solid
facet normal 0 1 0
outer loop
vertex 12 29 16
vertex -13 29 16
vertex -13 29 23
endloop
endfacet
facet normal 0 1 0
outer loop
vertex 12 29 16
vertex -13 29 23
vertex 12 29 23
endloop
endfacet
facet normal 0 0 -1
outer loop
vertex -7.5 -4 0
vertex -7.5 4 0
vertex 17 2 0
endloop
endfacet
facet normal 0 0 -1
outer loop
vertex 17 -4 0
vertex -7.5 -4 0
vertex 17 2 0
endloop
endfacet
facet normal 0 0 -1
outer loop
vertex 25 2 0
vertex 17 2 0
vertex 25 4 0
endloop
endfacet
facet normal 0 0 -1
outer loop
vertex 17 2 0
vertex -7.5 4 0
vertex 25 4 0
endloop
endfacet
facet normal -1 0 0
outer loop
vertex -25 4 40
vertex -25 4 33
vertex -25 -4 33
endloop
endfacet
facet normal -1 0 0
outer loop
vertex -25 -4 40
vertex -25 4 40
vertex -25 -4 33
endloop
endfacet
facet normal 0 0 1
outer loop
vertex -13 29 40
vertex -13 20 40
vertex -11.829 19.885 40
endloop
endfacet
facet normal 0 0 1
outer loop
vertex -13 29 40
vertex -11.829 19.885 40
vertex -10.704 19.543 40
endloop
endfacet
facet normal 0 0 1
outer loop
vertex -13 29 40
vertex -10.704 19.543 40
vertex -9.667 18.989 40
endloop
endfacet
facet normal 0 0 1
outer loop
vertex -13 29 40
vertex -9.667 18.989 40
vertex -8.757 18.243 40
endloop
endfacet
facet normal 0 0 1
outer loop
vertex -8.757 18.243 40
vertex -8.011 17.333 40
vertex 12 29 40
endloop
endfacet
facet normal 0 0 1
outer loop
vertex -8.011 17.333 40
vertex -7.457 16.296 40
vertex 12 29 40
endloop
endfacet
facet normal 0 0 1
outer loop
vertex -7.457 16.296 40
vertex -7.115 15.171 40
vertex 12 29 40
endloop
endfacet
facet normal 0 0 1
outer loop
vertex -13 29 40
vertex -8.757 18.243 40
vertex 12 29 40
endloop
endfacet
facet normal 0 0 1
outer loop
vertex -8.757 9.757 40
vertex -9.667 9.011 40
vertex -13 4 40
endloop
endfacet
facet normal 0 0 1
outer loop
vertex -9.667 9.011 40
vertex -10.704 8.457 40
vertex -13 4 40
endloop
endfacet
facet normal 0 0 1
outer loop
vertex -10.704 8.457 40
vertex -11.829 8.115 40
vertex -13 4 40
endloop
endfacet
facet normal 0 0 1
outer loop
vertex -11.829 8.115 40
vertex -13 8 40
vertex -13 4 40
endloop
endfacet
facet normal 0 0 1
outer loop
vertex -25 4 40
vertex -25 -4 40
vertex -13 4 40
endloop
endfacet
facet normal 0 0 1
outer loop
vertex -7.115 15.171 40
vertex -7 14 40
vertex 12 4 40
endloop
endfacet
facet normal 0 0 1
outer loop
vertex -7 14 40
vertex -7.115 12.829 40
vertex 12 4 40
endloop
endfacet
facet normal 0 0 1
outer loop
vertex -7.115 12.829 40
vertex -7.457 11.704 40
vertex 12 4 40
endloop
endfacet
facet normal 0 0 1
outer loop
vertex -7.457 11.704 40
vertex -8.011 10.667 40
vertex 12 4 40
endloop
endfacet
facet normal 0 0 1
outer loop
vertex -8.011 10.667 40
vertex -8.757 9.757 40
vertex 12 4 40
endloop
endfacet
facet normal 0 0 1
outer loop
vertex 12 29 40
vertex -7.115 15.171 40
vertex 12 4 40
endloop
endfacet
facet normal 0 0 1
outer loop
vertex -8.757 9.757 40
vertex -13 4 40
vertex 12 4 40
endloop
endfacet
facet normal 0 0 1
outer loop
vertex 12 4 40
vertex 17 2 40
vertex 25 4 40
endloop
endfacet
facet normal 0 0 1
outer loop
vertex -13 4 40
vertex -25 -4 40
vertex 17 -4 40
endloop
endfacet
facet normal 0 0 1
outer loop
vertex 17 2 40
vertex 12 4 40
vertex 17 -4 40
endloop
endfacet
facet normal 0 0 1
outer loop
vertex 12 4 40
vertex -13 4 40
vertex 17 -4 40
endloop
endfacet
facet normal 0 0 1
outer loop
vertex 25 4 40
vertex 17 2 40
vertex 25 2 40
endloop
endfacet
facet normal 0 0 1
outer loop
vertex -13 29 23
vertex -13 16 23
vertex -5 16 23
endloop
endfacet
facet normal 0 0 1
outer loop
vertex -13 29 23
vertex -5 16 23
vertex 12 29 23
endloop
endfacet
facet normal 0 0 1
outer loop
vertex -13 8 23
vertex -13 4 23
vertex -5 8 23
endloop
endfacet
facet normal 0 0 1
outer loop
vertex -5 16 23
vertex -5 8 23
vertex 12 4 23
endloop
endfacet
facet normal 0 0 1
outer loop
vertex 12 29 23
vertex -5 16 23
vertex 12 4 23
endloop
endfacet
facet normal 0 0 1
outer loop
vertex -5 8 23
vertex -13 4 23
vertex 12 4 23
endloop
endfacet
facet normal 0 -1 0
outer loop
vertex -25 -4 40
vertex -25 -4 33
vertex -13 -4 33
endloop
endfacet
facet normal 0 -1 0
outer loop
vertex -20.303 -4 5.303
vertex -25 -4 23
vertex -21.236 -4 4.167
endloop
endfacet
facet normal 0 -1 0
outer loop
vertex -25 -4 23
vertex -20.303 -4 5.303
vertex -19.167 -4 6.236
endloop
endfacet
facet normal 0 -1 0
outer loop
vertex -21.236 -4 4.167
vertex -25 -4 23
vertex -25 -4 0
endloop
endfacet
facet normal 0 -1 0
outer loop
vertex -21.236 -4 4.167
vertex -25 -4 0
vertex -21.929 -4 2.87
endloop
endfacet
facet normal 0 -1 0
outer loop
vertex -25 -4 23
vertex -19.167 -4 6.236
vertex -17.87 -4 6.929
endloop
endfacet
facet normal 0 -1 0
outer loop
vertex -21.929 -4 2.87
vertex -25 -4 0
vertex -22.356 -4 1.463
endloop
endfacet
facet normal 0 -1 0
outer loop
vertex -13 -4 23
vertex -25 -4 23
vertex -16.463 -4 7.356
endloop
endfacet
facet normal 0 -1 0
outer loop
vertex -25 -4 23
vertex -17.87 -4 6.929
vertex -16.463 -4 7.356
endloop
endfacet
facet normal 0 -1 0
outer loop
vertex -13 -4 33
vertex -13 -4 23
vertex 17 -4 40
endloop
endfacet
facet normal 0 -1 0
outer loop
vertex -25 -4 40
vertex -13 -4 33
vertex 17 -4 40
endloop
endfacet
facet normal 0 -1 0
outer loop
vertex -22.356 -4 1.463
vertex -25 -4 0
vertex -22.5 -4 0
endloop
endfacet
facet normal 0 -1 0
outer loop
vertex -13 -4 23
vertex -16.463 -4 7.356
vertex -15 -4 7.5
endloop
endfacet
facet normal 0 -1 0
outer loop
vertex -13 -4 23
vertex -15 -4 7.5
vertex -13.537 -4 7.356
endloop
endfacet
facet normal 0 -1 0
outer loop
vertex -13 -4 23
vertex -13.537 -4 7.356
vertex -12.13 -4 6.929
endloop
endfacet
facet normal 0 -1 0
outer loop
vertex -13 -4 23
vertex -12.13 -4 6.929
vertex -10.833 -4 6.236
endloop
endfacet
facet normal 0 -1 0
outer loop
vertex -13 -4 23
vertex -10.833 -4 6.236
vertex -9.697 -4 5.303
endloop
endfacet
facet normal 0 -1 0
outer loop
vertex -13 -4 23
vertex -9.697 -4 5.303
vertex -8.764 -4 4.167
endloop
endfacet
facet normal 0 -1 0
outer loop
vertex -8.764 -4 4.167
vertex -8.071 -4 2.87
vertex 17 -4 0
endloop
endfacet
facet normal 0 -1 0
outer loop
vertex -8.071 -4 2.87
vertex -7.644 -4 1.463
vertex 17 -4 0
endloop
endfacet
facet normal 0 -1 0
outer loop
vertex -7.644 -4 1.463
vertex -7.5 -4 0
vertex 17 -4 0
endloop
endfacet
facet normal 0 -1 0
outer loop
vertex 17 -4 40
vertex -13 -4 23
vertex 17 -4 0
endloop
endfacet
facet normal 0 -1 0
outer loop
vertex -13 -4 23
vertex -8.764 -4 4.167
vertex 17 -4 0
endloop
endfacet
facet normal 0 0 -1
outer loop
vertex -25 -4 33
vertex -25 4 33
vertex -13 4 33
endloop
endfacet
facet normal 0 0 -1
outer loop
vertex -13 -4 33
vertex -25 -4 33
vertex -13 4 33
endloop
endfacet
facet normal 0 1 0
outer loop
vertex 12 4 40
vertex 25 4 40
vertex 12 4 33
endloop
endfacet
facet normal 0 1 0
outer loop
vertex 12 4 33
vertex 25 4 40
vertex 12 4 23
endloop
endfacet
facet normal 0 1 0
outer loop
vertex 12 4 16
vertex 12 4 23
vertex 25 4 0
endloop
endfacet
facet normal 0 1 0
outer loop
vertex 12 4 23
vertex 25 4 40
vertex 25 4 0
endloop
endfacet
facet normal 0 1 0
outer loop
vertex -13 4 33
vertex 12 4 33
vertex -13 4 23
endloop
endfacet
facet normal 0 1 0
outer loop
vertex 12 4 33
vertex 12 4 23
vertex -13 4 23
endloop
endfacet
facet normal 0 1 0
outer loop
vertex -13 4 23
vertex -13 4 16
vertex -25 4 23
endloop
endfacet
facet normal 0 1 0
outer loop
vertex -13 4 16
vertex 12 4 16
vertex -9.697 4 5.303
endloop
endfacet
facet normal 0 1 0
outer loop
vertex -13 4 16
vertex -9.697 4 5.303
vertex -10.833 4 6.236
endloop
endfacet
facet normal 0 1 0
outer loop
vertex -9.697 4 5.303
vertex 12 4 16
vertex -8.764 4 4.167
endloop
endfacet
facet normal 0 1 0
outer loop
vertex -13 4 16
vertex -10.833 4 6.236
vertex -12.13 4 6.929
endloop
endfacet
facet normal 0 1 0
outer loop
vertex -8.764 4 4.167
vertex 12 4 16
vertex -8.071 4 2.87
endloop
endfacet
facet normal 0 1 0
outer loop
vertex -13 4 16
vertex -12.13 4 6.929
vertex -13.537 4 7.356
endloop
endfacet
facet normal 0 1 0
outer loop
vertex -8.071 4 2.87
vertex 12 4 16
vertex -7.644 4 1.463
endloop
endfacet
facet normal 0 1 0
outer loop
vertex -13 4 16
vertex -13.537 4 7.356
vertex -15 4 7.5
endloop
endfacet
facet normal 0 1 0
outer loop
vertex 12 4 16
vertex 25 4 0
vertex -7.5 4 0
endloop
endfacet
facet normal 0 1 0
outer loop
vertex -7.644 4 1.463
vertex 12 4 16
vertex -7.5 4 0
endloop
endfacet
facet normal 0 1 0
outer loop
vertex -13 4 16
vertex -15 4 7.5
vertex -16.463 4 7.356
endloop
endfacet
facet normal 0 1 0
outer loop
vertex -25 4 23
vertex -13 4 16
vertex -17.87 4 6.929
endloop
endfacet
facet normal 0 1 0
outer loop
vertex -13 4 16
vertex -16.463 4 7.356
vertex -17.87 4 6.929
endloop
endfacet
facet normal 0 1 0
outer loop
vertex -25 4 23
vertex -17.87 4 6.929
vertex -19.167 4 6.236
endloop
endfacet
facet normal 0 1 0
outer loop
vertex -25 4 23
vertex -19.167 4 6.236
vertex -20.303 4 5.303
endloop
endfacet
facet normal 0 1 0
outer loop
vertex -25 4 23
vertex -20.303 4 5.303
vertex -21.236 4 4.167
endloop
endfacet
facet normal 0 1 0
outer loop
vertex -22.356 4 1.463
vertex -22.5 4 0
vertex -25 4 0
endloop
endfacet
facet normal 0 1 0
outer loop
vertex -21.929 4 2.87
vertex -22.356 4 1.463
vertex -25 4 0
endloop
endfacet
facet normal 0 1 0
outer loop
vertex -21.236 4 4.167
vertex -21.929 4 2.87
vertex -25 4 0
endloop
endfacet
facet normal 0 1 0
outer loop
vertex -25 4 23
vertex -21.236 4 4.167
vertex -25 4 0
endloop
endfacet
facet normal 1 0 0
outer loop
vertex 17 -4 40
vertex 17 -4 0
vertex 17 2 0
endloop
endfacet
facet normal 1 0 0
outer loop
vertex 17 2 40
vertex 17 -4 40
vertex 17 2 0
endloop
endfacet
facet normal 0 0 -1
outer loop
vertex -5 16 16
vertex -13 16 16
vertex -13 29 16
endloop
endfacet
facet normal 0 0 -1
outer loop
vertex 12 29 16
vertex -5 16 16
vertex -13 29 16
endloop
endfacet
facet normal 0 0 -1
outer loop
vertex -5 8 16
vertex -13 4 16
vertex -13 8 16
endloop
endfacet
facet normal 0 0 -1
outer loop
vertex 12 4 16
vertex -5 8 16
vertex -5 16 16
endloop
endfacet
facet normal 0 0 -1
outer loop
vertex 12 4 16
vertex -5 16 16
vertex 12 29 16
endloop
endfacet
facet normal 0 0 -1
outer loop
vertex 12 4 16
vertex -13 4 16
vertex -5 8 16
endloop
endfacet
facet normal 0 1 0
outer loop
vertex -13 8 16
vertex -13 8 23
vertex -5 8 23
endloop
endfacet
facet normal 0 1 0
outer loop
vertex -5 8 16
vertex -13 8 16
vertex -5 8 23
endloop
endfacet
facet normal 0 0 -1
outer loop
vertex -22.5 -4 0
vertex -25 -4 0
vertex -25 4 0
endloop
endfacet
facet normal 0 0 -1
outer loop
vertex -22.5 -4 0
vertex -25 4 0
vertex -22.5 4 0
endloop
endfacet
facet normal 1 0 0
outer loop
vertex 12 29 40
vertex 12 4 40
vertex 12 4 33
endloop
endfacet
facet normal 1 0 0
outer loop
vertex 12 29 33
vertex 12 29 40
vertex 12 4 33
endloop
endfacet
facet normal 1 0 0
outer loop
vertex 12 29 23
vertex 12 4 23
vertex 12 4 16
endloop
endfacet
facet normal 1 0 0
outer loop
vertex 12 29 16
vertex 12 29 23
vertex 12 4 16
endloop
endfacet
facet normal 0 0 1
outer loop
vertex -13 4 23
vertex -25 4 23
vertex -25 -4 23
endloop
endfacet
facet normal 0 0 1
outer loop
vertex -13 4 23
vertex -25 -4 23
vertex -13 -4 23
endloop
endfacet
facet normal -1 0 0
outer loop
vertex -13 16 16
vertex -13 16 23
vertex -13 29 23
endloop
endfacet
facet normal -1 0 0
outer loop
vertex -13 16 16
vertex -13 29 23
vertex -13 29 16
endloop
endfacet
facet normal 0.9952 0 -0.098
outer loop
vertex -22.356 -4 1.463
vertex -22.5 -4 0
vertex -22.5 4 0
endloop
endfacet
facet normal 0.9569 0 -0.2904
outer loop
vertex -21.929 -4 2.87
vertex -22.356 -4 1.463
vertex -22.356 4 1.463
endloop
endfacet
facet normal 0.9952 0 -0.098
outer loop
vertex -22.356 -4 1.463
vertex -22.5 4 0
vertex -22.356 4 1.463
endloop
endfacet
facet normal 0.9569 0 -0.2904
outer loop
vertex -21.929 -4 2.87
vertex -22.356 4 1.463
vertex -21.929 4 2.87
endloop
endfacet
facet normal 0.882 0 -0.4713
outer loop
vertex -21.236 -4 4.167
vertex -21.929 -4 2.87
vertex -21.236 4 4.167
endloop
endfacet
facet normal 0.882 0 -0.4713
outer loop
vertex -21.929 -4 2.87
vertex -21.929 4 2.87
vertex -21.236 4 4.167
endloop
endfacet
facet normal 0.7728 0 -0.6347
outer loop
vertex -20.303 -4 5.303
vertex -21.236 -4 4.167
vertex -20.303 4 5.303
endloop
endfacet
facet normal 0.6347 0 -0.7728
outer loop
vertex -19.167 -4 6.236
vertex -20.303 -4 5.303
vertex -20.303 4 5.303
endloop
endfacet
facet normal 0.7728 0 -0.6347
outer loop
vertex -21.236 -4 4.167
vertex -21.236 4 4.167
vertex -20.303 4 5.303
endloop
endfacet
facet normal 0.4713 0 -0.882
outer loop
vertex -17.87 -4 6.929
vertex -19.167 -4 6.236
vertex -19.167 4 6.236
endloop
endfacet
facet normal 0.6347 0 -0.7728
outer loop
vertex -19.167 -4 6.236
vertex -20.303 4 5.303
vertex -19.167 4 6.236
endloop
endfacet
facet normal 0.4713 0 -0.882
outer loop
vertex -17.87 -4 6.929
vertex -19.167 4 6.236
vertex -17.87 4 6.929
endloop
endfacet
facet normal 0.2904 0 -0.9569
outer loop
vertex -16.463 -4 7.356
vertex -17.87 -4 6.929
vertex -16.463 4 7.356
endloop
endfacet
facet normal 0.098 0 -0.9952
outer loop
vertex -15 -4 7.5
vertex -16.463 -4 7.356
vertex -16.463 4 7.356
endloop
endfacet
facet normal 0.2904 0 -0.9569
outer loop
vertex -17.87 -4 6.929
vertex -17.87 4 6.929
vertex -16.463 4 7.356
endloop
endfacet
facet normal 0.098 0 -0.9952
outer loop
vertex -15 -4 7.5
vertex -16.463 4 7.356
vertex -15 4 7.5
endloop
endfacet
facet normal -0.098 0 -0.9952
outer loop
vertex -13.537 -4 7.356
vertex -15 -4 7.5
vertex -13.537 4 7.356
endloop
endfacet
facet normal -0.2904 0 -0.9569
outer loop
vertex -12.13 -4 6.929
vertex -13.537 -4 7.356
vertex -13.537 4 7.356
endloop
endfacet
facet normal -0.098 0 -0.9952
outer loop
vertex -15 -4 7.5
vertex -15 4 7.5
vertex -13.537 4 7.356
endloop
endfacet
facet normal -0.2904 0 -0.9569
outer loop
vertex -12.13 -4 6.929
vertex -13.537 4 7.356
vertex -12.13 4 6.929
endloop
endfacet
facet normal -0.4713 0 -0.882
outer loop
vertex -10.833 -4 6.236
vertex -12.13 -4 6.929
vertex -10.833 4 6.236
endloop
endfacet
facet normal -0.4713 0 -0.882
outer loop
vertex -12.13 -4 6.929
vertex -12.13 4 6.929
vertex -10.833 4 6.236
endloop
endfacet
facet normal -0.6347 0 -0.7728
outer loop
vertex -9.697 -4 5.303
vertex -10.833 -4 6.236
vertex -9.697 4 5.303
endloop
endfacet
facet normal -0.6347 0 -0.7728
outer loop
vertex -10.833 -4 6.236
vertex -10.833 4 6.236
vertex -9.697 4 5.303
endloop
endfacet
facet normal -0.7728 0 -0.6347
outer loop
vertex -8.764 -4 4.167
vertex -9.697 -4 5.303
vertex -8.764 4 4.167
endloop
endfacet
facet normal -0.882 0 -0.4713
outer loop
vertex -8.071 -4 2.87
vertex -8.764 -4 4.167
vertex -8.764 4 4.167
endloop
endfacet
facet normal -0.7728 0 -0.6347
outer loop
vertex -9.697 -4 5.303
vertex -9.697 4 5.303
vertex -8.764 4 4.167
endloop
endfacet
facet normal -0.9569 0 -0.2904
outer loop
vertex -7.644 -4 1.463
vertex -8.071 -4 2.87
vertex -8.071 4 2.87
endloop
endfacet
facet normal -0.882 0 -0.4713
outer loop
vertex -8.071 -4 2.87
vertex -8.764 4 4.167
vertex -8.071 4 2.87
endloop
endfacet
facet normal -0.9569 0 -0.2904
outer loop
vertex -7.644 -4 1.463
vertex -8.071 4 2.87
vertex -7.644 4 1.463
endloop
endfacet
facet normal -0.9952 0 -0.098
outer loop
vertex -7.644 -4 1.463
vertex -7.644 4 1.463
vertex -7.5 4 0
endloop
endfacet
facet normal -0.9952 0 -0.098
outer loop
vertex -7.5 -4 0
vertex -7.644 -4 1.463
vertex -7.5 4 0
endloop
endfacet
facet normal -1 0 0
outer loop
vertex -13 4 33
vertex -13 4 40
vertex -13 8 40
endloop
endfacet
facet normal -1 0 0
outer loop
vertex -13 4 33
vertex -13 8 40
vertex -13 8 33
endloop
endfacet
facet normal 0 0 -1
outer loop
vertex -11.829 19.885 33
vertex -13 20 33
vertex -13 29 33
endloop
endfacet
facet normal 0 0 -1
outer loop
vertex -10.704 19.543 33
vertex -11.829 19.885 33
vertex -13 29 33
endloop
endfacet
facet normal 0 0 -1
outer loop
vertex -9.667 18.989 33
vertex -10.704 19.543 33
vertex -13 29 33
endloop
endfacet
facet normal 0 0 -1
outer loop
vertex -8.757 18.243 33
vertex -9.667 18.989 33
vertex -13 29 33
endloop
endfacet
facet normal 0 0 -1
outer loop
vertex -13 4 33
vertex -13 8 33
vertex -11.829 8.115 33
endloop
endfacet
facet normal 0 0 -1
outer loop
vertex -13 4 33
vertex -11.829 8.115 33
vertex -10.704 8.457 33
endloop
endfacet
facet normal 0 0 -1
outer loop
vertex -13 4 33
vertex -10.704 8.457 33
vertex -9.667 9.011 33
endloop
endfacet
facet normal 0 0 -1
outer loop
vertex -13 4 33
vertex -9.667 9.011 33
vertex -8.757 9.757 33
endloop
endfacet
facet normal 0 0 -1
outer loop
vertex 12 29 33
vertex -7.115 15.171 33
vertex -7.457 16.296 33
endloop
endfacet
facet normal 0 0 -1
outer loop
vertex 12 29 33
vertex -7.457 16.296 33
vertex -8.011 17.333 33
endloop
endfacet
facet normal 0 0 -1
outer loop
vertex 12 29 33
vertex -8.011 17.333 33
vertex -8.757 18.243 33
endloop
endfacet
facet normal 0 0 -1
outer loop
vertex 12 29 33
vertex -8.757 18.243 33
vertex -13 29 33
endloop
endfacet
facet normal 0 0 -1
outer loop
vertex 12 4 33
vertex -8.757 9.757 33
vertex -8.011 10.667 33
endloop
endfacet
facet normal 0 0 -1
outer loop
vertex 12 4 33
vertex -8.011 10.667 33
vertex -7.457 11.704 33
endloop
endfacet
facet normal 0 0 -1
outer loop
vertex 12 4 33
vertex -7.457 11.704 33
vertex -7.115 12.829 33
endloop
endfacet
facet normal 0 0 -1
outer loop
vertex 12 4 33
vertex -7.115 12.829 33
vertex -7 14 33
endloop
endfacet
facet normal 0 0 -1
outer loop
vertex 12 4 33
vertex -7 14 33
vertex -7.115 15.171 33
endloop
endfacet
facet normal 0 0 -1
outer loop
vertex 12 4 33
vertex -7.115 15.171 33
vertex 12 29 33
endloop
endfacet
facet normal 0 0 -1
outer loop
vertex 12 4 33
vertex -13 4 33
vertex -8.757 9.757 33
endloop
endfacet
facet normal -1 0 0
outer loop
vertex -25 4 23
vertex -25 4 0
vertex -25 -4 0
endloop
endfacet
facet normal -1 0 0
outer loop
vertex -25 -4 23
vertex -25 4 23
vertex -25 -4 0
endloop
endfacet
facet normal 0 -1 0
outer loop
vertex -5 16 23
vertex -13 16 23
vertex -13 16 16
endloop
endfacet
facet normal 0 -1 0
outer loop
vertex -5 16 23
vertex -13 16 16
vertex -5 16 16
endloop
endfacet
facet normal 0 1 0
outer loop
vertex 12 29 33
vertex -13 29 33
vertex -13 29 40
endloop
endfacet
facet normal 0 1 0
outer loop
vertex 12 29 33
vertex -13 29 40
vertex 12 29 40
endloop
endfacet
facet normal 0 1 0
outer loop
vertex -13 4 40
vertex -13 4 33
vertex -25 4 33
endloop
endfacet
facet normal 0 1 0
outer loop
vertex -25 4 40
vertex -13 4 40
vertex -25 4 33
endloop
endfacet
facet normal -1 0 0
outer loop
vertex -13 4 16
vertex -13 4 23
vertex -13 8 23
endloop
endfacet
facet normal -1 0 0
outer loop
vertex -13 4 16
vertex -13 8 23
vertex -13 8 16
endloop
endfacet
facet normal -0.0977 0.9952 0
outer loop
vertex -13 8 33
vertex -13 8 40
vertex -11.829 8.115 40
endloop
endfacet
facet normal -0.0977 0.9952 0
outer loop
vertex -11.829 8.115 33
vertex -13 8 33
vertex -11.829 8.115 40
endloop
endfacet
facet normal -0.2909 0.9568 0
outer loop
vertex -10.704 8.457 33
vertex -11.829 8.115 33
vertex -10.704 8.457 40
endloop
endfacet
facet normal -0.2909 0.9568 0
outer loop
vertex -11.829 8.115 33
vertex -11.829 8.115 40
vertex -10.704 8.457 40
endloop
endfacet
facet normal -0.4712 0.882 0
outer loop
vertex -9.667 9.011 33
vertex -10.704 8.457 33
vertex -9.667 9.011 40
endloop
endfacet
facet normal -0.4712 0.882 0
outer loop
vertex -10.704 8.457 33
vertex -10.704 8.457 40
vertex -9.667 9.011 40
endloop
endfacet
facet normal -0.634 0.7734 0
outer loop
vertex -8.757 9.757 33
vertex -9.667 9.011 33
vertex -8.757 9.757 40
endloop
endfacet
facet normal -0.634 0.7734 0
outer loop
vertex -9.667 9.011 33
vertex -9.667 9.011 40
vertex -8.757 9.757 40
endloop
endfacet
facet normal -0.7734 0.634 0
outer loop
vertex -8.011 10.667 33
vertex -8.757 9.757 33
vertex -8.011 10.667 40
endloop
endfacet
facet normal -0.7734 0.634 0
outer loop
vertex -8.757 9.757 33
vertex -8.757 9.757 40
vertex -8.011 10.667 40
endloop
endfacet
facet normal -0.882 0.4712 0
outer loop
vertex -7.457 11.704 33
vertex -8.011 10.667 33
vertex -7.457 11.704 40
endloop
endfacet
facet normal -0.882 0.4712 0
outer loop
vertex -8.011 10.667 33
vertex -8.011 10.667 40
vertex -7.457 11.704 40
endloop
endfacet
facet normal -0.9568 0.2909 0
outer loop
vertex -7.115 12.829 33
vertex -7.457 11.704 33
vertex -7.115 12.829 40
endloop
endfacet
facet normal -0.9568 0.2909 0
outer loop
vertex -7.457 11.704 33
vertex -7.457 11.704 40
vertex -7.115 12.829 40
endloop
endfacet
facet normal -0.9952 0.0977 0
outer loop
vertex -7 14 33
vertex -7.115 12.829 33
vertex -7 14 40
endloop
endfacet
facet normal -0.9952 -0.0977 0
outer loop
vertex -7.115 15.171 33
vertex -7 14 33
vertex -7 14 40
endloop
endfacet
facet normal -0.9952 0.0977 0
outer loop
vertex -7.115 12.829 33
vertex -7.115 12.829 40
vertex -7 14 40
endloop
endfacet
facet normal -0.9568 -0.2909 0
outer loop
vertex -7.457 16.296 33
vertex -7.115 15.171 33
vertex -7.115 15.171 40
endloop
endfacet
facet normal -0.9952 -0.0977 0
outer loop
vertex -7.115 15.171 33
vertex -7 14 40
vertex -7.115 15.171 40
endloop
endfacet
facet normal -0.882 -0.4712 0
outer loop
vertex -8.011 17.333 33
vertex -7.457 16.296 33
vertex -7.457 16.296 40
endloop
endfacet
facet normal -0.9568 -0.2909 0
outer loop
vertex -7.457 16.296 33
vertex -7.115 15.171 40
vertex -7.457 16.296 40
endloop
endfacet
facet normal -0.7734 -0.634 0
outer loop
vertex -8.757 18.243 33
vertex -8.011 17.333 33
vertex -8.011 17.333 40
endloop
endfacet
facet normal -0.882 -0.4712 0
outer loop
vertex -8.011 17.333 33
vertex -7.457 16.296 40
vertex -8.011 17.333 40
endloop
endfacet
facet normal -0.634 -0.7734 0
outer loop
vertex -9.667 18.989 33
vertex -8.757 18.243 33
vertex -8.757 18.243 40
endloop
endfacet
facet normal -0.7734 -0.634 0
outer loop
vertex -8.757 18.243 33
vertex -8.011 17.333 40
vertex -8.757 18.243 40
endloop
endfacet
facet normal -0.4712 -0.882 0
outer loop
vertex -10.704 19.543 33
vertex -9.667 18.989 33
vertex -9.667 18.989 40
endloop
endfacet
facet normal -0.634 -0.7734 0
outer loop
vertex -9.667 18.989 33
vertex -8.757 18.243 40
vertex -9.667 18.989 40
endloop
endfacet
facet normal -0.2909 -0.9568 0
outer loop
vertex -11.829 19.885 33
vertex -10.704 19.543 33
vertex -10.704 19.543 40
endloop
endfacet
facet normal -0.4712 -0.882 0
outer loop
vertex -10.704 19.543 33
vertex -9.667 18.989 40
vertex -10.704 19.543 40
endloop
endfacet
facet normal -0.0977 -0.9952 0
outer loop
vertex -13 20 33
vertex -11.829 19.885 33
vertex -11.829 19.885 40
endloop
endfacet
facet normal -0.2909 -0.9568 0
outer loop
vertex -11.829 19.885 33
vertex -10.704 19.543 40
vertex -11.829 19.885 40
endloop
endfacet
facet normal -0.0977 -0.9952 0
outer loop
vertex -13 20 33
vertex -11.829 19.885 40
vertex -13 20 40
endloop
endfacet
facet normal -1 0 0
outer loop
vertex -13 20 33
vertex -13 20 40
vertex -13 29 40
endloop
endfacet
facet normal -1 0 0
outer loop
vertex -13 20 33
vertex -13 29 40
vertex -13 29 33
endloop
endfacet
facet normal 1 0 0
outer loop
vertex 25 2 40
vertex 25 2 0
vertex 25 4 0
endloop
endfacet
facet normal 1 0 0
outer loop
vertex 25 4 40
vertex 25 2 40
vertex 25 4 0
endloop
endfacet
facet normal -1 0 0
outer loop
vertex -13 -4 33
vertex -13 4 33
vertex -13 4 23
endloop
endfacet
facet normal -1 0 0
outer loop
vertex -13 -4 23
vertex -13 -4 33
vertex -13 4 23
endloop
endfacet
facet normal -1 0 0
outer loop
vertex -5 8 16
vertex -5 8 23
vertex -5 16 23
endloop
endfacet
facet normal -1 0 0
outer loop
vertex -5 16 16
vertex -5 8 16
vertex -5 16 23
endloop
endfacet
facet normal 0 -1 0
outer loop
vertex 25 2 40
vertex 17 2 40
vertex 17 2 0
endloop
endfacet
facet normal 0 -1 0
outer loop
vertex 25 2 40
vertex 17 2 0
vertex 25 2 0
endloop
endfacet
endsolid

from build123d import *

# Parameters (mm, degrees)
EXTRUDE_1_DEPTH     = 40
SKETCH_2_R          = 7.5
SKETCH_2_W          = 12
SKETCH_2_H          = 10
CUT_EXTRUDE_1_DEPTH = 48.843494856
SKETCH_3_W          = 25
SKETCH_3_H          = 7
EXTRUDE_2_DEPTH     = 25
CUT_EXTRUDE_2_REACH = 57.371
SKETCH_4_R          = 6
SKETCH_6_W          = 8
SKETCH_6_H          = 8
CUT_EXTRUDE_3_DEPTH = 45.665422868


with BuildPart() as part:
    # Эскиз1 → Бобышка-Вытянуть1 (new body)
    with BuildSketch(Plane.XY):
        Polygon((-25, 4), (-25, -4), (17, -4), (17, 2), (25, 2), (25, 4), align=None)
    extrude(amount=EXTRUDE_1_DEPTH)

    # Эскиз2 → Вырез-Вытянуть1 (cut, through all)
    with BuildSketch(Plane(origin=(0, 4, 0), x_dir=(1, 0, 0), z_dir=(0, 1, 0))):
        with Locations((-15, 0)):
            Circle(SKETCH_2_R)
        with Locations((-19, -28)):
            Rectangle(SKETCH_2_W, SKETCH_2_H)
    extrude(amount=-CUT_EXTRUDE_1_DEPTH, mode=Mode.SUBTRACT)

    # Эскиз3 → Бобышка-Вытянуть2 (add)
    with BuildSketch(Plane(origin=(0, 4, 0), x_dir=(1, 0, 0), z_dir=(0, 1, 0))):
        with Locations((-0.5, -36.5)):
            Rectangle(SKETCH_3_W, SKETCH_3_H)
        with Locations((-0.5, -19.5)):
            Rectangle(SKETCH_3_W, SKETCH_3_H)
    extrude(amount=EXTRUDE_2_DEPTH)

    # Эскиз4 → Вырез-Вытянуть2 (cut, up to next)
    with BuildSketch(Plane.XY.offset(40), mode=Mode.PRIVATE) as cut_extrude_2_sk1:
        with Locations((-13, 14)):
            Circle(SKETCH_4_R)
    cut_extrude_2_tool1 = extrude(cut_extrude_2_sk1.sketch, amount=-CUT_EXTRUDE_2_REACH, mode=Mode.PRIVATE) & part.part
    add(cut_extrude_2_tool1.solids().sort_by_distance((-13, 14, 40))[0], mode=Mode.SUBTRACT)

    # Эскиз6 → Вырез-Вытянуть3 (cut, through all)
    with BuildSketch(Plane.XY.offset(23)):
        with Locations((-9, 12)):
            Rectangle(SKETCH_6_W, SKETCH_6_H)
    extrude(amount=-CUT_EXTRUDE_3_DEPTH, mode=Mode.SUBTRACT)


solid = part.part
